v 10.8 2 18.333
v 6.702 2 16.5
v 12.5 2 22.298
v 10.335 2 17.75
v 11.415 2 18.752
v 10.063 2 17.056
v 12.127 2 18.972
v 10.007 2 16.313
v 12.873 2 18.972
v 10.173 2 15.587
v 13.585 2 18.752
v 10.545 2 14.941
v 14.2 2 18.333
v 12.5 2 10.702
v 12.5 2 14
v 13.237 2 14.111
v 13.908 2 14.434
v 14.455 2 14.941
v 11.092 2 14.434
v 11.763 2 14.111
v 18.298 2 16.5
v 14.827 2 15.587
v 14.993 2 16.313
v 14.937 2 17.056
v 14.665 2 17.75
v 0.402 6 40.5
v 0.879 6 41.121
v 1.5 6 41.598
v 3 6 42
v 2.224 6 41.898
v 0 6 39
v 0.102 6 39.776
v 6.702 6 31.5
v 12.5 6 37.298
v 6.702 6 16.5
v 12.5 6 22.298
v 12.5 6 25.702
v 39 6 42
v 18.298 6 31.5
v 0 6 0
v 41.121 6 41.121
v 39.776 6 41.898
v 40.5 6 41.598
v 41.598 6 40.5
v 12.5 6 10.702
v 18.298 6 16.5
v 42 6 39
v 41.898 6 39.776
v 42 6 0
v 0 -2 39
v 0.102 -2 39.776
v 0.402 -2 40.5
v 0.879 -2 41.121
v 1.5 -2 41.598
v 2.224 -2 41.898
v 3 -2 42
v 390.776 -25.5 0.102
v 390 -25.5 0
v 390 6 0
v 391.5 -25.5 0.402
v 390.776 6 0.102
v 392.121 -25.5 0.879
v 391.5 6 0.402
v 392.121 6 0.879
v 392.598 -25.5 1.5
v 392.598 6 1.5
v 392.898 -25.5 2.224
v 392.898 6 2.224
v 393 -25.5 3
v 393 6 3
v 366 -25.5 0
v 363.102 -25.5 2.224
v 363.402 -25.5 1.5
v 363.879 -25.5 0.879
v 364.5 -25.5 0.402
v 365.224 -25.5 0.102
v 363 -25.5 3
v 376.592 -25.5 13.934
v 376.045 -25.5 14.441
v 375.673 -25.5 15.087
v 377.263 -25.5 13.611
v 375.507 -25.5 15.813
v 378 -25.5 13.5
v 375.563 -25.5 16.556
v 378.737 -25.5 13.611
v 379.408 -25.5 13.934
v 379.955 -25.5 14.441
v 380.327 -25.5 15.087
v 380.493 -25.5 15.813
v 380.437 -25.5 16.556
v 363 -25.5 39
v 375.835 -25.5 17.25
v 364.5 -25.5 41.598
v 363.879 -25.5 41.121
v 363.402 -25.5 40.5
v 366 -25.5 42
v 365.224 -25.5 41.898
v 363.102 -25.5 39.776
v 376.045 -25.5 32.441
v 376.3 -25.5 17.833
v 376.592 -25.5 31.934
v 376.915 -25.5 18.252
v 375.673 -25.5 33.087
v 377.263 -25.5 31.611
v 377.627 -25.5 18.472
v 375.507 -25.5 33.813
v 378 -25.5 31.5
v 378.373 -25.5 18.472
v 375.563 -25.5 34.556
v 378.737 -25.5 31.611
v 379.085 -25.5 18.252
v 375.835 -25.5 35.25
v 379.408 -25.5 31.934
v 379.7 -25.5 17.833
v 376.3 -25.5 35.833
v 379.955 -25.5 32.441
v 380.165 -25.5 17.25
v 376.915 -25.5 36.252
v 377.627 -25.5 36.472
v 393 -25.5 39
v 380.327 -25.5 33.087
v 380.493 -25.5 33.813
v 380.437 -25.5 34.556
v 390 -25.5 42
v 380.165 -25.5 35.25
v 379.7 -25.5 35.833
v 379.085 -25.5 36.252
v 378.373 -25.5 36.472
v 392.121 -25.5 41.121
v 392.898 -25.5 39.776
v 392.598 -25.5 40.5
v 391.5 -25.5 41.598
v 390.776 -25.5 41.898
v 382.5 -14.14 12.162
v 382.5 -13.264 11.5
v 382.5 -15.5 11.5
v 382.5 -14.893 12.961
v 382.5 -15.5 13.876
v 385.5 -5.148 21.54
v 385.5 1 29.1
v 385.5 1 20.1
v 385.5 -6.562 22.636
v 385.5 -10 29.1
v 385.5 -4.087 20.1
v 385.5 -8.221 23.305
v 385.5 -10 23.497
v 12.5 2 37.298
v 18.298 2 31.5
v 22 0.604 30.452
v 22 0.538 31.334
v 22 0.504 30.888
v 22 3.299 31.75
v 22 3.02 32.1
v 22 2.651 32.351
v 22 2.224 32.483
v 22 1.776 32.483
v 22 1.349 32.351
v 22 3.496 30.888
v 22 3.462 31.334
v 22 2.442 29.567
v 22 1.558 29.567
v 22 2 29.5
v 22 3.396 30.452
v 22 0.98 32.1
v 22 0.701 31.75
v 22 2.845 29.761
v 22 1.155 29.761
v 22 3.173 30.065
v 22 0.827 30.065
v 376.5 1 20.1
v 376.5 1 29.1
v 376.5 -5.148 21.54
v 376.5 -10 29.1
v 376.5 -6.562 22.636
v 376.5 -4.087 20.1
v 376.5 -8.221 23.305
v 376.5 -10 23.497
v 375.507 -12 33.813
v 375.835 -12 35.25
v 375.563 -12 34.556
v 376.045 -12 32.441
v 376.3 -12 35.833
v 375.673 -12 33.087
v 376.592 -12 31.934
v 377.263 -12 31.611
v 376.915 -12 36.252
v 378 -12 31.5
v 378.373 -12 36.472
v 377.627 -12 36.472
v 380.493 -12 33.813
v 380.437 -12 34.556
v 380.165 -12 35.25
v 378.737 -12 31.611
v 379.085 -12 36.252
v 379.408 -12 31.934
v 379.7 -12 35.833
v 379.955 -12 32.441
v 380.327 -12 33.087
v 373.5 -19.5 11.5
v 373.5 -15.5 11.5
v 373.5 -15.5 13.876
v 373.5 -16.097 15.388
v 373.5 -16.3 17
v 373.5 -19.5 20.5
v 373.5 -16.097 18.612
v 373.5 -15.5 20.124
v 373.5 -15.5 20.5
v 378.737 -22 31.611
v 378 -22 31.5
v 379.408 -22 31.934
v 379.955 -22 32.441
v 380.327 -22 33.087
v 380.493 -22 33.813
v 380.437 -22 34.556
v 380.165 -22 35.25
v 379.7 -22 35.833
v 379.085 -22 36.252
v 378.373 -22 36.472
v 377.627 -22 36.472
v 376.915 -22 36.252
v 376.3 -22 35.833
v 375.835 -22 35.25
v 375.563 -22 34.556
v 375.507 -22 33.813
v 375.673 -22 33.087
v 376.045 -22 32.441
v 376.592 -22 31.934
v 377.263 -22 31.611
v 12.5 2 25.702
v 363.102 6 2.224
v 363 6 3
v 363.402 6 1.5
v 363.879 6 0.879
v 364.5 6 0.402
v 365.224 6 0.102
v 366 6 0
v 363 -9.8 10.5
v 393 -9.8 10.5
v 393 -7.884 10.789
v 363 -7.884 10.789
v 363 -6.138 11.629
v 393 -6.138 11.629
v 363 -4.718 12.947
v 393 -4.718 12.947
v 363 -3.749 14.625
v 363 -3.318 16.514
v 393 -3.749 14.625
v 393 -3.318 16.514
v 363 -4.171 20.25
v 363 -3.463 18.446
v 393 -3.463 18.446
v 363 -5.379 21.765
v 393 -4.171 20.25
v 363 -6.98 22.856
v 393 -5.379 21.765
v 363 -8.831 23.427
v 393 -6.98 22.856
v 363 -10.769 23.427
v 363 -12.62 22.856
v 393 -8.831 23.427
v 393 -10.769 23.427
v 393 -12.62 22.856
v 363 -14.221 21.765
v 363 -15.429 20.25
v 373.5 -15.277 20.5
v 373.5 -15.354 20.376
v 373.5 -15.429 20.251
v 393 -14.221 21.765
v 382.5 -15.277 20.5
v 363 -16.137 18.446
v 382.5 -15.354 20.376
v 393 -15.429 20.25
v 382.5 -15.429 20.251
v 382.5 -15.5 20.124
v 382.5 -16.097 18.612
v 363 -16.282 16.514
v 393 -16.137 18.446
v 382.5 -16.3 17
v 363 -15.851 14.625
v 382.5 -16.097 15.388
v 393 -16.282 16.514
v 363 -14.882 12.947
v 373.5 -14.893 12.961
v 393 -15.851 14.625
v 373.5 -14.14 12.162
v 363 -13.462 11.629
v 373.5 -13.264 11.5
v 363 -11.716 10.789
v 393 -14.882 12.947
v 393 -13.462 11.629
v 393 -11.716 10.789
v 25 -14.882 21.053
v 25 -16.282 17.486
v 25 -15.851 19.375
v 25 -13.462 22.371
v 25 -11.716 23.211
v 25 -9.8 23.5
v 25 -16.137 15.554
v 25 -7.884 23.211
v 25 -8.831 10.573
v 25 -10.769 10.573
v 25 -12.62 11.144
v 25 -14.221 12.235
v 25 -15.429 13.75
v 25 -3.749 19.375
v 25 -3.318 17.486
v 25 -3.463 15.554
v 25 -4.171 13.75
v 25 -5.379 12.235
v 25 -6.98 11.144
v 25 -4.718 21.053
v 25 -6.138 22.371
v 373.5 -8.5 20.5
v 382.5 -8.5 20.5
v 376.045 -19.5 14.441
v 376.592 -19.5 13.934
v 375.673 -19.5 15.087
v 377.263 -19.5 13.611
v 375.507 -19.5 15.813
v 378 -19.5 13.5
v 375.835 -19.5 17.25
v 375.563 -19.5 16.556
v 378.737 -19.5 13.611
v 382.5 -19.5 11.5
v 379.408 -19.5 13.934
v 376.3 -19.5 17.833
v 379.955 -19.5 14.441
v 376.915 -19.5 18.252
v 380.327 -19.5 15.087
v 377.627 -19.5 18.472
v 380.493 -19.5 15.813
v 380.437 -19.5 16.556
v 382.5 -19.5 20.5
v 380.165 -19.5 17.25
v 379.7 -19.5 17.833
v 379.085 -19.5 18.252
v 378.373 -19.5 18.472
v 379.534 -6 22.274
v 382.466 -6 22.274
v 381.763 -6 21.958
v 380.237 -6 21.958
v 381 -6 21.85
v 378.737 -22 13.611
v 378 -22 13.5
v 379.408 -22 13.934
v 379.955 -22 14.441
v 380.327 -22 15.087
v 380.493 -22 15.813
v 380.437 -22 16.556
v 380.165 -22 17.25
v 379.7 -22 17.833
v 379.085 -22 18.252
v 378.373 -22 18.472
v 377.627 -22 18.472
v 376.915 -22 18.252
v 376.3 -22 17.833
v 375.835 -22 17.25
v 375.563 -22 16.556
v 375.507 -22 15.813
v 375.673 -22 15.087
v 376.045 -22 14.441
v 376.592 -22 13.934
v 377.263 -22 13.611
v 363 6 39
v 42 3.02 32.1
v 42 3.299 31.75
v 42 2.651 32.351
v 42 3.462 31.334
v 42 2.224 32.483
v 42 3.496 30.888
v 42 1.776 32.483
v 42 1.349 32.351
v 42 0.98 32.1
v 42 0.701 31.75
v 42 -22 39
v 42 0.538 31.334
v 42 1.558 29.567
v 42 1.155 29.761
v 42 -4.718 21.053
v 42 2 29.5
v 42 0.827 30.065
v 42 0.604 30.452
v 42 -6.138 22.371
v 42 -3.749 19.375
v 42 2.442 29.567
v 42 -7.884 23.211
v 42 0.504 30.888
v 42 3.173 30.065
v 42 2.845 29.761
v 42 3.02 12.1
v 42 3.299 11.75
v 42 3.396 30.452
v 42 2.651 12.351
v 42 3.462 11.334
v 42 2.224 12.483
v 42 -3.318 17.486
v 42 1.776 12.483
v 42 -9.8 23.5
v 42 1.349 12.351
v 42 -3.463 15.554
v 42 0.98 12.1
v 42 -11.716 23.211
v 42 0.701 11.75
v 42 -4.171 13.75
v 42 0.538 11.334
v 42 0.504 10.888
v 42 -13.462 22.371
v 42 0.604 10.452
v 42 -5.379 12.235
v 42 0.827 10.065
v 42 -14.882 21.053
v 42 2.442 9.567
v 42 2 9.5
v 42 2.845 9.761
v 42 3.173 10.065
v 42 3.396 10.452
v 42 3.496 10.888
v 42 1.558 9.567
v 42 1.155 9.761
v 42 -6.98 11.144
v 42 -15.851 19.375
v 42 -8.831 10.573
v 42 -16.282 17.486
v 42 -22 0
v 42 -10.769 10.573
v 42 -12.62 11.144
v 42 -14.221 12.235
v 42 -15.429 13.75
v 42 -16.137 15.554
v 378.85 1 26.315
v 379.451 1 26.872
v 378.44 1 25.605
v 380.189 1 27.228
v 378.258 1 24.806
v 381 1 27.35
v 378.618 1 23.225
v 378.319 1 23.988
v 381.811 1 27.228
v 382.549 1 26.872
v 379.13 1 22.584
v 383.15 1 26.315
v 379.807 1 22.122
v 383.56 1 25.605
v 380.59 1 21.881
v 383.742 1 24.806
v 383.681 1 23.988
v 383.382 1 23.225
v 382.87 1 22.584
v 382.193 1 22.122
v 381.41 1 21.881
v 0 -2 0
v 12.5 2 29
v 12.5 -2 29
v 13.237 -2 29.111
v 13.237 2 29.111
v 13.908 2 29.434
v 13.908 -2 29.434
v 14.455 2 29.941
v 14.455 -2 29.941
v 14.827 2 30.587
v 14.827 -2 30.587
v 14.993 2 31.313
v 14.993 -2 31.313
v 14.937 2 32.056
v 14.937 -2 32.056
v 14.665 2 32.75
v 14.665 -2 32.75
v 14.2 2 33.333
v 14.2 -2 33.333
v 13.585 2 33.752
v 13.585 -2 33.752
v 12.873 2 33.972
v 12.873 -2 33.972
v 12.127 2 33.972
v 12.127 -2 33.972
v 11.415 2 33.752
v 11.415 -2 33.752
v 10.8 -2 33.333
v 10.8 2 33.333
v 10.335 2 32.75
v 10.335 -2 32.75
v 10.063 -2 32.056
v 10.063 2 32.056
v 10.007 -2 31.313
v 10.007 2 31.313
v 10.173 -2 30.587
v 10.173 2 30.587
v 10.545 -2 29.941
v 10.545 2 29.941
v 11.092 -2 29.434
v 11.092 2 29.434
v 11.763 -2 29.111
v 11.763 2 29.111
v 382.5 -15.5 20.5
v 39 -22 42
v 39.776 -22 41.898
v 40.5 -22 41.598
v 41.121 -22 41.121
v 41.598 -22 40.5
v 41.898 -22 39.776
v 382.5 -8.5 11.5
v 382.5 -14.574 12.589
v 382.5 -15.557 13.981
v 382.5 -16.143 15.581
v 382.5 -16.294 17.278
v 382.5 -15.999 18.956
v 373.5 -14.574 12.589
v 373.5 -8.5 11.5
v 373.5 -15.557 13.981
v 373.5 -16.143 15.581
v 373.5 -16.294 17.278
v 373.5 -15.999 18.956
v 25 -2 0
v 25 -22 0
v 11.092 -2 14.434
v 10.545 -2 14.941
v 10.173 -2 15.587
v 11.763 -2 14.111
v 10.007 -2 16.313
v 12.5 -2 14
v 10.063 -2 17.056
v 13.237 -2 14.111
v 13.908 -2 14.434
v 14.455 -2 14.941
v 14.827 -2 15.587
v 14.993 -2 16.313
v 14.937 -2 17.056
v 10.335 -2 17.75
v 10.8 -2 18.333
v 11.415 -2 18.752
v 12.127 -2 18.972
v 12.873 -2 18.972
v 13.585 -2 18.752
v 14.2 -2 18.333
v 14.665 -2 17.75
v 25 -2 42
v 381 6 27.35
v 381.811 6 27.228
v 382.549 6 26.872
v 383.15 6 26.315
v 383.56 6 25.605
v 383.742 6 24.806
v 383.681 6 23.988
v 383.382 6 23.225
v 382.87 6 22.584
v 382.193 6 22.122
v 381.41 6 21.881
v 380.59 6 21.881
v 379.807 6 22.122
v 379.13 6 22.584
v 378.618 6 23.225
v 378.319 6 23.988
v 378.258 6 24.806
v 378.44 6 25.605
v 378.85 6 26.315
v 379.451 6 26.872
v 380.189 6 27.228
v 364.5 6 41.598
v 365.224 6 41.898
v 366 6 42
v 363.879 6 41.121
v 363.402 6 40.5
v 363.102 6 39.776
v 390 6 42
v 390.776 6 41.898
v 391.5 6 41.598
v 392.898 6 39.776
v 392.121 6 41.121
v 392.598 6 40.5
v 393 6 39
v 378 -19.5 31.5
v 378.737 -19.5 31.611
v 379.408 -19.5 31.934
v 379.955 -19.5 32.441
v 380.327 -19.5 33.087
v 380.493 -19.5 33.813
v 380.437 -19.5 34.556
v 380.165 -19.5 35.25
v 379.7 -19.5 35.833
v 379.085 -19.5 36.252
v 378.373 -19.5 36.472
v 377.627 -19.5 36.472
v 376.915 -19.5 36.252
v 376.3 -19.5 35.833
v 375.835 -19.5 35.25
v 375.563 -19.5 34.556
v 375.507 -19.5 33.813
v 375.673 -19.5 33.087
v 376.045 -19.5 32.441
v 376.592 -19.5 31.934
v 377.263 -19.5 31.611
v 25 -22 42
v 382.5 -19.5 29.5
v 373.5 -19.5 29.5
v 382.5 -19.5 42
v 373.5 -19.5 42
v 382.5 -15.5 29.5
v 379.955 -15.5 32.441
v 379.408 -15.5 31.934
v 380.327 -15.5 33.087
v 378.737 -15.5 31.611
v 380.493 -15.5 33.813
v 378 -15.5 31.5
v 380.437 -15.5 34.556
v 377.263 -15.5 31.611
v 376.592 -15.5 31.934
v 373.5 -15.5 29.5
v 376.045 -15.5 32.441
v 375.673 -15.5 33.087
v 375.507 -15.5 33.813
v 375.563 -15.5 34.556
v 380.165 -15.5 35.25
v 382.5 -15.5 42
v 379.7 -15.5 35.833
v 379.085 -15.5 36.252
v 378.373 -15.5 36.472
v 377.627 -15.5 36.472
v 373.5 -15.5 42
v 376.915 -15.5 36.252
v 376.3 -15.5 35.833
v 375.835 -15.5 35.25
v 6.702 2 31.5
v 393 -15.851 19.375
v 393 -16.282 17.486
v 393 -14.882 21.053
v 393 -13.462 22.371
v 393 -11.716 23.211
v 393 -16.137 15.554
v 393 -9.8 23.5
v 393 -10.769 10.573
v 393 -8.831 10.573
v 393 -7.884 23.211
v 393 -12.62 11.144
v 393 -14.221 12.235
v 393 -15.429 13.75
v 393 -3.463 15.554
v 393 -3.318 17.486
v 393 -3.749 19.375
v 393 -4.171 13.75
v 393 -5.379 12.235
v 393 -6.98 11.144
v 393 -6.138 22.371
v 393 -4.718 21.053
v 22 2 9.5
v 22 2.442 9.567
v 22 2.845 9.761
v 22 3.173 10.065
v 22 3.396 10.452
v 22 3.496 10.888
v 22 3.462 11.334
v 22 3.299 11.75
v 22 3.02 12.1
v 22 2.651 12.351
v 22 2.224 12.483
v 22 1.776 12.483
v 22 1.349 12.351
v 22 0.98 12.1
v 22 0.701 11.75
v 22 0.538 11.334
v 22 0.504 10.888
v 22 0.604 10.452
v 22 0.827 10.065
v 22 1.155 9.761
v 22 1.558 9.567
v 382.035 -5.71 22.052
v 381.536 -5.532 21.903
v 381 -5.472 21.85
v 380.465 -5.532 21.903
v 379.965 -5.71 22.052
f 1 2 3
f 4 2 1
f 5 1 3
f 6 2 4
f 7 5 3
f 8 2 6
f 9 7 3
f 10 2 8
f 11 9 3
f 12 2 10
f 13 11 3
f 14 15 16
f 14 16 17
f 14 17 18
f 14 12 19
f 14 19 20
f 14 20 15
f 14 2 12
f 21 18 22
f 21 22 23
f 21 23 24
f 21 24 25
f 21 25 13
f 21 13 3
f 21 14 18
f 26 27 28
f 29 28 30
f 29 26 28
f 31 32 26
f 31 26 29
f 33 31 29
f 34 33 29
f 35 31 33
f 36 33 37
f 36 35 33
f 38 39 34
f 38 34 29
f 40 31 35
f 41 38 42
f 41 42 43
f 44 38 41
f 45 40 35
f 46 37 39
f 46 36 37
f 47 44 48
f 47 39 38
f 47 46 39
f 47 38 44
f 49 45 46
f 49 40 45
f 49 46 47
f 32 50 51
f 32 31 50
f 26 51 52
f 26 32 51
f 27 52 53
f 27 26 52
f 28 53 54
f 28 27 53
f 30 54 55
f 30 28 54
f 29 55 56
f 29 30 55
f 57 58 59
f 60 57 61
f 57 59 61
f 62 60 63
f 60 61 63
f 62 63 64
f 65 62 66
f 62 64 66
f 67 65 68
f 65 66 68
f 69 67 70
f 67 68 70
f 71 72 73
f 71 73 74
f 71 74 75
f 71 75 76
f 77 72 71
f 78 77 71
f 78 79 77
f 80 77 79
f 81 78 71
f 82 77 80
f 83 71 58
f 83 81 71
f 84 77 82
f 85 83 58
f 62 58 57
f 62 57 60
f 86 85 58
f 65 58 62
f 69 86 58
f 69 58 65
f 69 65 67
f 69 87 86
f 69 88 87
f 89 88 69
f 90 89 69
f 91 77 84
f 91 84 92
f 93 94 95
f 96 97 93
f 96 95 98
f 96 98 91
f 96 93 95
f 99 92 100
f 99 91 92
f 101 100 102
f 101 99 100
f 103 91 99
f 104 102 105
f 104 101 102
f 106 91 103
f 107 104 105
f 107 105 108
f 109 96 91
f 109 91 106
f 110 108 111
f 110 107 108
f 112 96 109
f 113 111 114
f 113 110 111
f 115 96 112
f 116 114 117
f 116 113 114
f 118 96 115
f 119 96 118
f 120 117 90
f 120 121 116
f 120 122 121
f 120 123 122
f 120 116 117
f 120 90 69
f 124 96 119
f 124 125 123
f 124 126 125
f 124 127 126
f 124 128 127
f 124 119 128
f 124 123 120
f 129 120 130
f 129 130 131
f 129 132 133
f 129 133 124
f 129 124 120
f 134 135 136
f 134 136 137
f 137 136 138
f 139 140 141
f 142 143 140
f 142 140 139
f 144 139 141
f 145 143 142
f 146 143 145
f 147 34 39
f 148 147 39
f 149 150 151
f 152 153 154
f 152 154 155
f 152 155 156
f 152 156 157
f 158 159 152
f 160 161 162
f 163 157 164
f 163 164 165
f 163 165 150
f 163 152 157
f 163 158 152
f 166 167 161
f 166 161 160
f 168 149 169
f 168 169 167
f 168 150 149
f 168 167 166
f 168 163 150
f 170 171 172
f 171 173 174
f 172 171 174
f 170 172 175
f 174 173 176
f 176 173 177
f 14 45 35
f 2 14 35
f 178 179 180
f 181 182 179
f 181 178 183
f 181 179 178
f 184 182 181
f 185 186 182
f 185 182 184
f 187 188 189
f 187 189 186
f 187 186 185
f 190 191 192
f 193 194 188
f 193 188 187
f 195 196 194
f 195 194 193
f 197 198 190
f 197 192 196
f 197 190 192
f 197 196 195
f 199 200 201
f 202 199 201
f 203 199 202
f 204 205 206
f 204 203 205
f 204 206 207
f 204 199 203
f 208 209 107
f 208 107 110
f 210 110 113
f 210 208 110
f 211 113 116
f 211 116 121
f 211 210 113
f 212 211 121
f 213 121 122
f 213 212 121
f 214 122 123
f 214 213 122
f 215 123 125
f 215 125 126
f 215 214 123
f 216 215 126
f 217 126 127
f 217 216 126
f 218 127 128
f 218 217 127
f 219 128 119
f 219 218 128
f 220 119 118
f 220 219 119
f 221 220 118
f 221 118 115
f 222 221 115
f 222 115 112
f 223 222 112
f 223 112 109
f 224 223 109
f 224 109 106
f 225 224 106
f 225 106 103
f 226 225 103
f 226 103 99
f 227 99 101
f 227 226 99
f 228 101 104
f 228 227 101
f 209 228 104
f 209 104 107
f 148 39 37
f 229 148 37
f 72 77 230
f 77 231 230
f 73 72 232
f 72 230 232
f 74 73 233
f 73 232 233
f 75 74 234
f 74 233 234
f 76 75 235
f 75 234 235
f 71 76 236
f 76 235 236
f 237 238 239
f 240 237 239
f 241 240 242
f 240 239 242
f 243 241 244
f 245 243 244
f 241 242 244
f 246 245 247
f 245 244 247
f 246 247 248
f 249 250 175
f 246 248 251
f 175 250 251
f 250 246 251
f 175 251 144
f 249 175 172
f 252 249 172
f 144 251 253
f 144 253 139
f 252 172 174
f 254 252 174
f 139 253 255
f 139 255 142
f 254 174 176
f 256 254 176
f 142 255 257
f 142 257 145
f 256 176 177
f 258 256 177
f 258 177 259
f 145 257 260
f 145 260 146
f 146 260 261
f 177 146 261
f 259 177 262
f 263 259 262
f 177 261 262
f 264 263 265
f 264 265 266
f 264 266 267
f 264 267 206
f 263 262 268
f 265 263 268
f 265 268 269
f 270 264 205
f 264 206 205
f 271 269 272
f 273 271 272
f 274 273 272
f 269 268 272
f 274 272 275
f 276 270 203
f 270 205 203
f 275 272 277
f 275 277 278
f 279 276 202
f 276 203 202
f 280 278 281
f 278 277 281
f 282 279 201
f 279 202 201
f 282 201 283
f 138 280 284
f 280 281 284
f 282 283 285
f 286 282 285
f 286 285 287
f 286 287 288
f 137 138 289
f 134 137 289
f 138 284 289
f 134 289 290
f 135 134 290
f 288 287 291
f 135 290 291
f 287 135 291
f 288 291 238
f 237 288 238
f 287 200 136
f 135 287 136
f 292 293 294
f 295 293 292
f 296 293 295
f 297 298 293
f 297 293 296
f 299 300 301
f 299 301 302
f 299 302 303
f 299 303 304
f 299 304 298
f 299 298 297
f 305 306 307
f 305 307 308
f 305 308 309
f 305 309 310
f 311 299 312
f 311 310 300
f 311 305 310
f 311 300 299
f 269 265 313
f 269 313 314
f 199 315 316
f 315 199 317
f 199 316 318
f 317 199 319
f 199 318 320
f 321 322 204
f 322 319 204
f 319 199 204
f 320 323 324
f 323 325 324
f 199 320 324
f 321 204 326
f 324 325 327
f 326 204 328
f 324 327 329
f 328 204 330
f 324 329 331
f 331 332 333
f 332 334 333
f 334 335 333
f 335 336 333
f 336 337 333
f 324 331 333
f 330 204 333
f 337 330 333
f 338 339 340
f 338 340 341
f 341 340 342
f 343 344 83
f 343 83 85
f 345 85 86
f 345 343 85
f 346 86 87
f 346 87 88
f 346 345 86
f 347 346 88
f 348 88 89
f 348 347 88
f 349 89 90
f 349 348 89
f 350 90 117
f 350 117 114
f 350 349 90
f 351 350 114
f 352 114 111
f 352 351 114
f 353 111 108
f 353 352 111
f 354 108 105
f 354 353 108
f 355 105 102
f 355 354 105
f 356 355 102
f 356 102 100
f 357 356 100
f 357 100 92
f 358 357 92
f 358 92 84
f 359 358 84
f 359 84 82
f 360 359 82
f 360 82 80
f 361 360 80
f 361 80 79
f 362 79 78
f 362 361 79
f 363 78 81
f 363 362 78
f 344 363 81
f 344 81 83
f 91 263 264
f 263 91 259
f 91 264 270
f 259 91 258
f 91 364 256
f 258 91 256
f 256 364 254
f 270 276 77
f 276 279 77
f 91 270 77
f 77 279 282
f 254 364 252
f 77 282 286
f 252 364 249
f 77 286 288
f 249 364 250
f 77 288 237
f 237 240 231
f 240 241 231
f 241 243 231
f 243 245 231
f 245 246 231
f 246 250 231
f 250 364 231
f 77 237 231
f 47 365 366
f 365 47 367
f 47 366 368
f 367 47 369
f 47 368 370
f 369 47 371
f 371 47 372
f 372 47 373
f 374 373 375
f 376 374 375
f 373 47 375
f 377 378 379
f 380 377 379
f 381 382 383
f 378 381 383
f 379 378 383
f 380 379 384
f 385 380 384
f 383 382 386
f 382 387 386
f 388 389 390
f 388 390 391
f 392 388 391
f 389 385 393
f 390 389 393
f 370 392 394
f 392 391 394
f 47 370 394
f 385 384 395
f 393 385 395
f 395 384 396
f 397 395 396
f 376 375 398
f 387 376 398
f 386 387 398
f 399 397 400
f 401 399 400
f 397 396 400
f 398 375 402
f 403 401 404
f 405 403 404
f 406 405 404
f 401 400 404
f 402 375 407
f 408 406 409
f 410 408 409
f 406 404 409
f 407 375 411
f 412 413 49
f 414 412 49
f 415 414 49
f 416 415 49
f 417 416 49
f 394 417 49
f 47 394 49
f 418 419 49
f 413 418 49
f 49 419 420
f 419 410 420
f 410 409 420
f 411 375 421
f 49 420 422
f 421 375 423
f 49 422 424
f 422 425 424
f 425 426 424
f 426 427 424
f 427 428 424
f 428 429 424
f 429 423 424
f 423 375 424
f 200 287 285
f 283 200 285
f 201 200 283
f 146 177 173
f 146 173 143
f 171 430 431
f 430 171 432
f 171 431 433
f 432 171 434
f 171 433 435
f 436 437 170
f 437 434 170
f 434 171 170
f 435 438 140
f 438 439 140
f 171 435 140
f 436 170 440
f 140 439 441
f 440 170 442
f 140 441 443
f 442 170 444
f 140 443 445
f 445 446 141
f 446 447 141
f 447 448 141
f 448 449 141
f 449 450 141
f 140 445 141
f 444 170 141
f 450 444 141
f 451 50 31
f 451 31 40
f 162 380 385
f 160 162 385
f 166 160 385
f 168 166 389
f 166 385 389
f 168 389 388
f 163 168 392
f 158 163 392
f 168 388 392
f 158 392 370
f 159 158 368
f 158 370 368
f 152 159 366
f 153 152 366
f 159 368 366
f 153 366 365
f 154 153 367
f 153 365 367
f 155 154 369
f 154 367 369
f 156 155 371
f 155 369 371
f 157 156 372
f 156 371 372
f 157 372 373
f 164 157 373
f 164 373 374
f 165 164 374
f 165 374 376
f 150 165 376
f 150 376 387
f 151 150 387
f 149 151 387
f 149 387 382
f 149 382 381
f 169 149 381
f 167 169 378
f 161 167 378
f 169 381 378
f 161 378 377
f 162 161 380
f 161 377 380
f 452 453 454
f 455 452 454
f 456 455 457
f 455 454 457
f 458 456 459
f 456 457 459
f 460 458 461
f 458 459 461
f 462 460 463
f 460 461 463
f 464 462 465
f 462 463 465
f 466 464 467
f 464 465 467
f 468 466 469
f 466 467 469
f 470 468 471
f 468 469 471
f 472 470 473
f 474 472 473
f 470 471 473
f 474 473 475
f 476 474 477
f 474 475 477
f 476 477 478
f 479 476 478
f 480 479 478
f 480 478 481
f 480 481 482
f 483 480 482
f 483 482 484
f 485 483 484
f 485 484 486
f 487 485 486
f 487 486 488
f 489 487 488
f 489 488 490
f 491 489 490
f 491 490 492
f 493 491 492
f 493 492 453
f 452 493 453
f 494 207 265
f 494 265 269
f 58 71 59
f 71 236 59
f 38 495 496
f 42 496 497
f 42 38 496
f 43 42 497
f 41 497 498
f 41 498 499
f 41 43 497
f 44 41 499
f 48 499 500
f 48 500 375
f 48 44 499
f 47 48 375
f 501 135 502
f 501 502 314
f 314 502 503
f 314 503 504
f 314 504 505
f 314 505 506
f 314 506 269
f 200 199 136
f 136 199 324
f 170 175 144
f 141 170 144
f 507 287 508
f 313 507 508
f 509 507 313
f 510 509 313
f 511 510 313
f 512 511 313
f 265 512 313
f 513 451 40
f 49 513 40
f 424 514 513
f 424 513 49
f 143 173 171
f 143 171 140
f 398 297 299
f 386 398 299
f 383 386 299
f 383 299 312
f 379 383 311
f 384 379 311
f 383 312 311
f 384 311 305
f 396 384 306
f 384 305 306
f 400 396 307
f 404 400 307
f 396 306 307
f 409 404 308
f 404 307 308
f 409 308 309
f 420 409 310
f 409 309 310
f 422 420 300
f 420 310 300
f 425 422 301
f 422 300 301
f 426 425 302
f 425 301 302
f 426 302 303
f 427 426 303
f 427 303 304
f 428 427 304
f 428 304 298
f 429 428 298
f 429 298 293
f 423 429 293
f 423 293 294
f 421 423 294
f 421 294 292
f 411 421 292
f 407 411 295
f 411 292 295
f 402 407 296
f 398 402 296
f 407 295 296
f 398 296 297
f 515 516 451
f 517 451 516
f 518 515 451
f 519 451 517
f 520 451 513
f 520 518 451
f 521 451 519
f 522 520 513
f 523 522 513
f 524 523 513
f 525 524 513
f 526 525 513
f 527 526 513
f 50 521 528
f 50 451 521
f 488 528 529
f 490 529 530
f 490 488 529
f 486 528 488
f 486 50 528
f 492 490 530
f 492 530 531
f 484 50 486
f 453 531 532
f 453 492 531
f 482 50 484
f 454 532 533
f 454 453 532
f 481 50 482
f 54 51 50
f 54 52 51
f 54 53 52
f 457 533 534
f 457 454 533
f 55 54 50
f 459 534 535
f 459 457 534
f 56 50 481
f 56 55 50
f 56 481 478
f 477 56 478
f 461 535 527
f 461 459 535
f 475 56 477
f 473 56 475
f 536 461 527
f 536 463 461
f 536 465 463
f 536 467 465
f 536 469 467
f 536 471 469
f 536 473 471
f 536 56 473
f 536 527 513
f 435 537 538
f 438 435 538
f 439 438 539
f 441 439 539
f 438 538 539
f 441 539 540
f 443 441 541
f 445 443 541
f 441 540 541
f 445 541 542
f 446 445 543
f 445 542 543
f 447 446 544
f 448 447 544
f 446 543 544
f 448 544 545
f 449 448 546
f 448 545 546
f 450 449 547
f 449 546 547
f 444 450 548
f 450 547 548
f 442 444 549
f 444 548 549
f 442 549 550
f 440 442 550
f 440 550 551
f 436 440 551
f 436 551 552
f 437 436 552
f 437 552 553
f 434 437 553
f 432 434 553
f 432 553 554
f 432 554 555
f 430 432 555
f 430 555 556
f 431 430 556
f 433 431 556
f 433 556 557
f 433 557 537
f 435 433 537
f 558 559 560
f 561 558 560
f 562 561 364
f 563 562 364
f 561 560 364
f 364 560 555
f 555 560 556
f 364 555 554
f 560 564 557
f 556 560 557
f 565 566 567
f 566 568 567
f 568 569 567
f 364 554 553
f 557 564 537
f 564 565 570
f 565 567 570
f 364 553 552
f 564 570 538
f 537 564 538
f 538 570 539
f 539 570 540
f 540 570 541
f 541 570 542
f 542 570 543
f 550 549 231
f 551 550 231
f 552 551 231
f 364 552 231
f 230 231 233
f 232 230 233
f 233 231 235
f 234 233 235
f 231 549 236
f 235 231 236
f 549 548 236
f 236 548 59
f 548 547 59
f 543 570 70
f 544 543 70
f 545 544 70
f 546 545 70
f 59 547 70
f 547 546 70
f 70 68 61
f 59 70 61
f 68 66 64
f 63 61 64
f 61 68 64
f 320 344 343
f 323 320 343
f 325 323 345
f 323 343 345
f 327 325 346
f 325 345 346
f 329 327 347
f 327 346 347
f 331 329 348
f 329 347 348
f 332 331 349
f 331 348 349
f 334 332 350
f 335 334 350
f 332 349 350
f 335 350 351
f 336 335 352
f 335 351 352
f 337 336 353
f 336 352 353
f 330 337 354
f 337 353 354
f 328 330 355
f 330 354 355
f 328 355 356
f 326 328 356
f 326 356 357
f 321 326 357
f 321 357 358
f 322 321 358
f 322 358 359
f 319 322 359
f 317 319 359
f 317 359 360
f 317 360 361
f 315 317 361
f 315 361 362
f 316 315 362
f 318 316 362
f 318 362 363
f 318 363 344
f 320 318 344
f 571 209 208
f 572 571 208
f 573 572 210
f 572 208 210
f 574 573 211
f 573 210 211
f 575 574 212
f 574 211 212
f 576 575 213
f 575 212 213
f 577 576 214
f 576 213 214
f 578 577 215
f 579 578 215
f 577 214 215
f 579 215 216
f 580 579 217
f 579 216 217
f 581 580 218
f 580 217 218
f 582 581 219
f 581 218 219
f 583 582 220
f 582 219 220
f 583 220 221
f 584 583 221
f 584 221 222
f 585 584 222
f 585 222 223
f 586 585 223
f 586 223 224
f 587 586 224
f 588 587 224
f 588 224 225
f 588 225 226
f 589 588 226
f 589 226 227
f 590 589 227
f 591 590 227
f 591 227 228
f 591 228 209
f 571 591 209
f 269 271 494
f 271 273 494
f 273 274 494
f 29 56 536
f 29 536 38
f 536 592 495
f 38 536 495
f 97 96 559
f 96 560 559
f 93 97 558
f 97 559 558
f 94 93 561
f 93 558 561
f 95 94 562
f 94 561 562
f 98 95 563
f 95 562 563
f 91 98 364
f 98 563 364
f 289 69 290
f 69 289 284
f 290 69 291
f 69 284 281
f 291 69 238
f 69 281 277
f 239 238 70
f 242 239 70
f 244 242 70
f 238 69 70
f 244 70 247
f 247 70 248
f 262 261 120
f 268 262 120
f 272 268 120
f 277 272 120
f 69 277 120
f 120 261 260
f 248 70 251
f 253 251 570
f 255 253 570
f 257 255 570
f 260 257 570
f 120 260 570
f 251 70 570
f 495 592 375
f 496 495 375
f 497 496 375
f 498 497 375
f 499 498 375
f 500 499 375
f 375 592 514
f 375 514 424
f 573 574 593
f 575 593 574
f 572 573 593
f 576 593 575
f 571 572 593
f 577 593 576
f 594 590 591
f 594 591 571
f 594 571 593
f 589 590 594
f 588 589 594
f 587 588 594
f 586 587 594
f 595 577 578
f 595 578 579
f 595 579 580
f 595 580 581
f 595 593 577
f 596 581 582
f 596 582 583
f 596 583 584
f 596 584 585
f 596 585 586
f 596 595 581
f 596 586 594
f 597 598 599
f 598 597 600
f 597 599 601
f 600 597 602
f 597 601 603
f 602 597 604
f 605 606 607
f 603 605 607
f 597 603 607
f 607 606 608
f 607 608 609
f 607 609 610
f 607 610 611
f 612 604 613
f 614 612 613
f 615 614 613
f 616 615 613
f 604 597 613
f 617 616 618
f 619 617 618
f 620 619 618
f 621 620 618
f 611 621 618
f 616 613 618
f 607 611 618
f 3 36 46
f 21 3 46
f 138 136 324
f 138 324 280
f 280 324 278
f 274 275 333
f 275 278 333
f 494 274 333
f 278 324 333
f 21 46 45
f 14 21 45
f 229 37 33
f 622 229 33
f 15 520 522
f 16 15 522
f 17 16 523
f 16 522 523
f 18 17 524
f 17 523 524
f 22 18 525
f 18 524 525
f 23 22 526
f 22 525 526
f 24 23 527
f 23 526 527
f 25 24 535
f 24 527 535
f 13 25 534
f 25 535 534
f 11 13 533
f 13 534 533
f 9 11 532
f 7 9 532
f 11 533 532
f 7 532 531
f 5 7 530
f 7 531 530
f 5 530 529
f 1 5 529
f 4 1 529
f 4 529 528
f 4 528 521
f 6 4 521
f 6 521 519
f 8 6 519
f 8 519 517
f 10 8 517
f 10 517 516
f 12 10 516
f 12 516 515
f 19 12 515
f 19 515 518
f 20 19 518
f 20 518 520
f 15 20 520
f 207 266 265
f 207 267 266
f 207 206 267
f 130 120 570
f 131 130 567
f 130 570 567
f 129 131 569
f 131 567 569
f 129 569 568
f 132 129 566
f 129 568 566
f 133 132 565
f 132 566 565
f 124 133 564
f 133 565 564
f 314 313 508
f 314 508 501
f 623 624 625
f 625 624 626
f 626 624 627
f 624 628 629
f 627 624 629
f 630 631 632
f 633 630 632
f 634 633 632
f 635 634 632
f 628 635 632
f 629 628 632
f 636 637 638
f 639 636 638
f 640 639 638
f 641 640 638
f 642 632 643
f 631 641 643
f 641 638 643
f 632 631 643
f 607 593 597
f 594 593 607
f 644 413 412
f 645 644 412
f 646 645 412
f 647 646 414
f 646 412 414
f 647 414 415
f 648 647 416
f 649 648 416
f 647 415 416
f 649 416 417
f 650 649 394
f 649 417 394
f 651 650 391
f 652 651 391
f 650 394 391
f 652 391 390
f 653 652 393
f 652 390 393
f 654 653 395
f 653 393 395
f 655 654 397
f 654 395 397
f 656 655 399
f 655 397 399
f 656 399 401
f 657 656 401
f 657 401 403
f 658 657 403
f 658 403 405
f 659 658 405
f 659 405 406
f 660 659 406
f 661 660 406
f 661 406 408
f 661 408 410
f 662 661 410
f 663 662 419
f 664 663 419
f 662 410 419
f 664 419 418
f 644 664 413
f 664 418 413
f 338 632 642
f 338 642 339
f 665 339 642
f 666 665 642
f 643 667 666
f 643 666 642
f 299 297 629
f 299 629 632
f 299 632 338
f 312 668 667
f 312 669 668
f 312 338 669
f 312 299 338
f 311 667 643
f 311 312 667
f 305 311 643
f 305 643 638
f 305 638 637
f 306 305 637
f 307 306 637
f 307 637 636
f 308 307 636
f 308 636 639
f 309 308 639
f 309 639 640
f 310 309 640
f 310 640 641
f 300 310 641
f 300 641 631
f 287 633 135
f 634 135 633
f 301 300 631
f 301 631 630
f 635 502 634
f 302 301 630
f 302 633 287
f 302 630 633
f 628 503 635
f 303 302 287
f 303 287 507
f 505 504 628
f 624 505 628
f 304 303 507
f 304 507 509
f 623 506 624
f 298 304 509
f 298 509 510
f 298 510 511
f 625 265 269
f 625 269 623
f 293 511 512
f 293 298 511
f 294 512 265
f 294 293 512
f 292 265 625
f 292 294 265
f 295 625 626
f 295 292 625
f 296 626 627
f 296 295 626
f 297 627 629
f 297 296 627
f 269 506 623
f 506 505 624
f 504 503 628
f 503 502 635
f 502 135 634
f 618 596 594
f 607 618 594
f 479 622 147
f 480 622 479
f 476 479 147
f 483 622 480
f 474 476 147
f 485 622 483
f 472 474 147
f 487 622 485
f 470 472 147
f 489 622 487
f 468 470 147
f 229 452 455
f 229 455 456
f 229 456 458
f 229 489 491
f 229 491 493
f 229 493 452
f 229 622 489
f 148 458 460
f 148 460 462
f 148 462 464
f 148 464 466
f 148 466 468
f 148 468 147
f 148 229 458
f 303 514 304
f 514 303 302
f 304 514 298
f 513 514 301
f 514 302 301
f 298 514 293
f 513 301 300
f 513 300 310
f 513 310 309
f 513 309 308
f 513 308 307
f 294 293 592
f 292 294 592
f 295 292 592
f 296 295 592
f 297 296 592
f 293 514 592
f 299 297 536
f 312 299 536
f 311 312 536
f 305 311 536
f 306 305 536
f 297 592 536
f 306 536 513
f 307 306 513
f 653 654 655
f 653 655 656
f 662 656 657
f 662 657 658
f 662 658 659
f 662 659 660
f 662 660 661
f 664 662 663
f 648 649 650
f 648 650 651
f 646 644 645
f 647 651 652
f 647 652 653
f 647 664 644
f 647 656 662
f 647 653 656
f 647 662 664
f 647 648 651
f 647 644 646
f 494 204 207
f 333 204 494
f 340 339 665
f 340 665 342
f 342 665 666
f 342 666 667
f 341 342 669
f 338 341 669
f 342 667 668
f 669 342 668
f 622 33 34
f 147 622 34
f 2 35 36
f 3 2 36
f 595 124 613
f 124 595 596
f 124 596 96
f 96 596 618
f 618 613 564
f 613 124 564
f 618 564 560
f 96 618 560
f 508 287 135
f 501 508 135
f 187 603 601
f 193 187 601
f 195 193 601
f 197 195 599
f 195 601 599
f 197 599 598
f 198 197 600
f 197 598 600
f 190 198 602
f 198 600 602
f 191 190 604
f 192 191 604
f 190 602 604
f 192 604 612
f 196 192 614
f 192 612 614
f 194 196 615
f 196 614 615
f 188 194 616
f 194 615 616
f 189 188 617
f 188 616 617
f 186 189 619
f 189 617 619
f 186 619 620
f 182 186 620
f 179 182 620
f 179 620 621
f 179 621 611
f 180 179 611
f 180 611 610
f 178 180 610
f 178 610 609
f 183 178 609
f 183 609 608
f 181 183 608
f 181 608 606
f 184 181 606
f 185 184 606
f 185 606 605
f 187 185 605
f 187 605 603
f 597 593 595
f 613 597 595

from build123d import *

# Parameters (mm, degrees)
SKETCH2_W                = 42
SKETCH2_H                = 42
BOSS_EXTRUDE1_DEPTH      = 22
SKETCH3_W                = 42
SKETCH3_H                = 42
BOSS_EXTRUDE2_DEPTH      = 6
BOSS_EXTRUDE3_START      = -25
SKETCH4_R                = 6.5
BOSS_EXTRUDE3_DEPTH      = 368
CUT_EXTRUDE6_START       = -25
SKETCH4_3_R              = 6.5
CUT_EXTRUDE6_DEPTH       = 17
SKETCH8_W                = 42
SKETCH8_H                = 28
SKETCH8_R                = 6.5
BOSS_EXTRUDE5_DEPTH      = 30
SKETCH11_W               = 25
SKETCH11_H               = 20
CUT_EXTRUDE9_DEPTH       = 50
SKETCH10_R               = 2.75
CUT_EXTRUDE8_DEPTH       = 12
FILLET2_R                = 3
FILLET1_R                = 3
SKETCH12_R               = 2.5
CUT_EXTRUDE10_DEPTH      = 20
CUT_EXTRUDE11_DEPTH      = 4
SKETCH14_R               = 2.5
CUT_EXTRUDE12_DEPTH      = 10
SKETCH15_R               = 1.5
CUT_EXTRUDE13_DEPTH      = 20
SKETCH16_R               = 2.5
BOSS_EXTRUDE6_DEPTH      = 3.5
CUT_EXTRUDE14_START      = -6
SKETCH18_W               = 9
SKETCH18_H               = 9
CUT_EXTRUDE14_DEPTH      = 4
SKETCH19_W               = 9
SKETCH19_H               = 9
CUT_EXTRUDE15_DEPTH      = 7
CUT_EXTRUDE16_DEPTH      = 7
CUT_EXTRUDE16_DEPTH_BACK = 4
SKETCH20_W               = 9
SKETCH20_H               = 9


with BuildPart() as part:
    # Sketch2 → Boss-Extrude1 (new body)
    with BuildSketch(Plane(origin=(0, 0, 0), x_dir=(1, 0, 0), z_dir=(0, 1, 0))):
        with Locations((21, -21)):
            Rectangle(SKETCH2_W, SKETCH2_H)
    extrude(amount=-BOSS_EXTRUDE1_DEPTH)

    # Sketch3 → Boss-Extrude2 (add)
    with BuildSketch(Plane(origin=(0, 0, 0), x_dir=(1, 0, 0), z_dir=(0, 1, 0))):
        with Locations((21, -21)):
            Rectangle(SKETCH3_W, SKETCH3_H)
    extrude(amount=BOSS_EXTRUDE2_DEPTH)

    # Sketch4<3> → Cut-Extrude6 (cut)
    with BuildSketch(Plane.ZY.offset(CUT_EXTRUDE6_START)):
        with Locations((17, -9.8)):
            Circle(SKETCH4_3_R)
    extrude(amount=-CUT_EXTRUDE6_DEPTH, mode=Mode.SUBTRACT)

    # Sketch11 → Cut-Extrude9 (cut)
    with BuildSketch(Plane.XY.offset(42)):
        with Locations((12.5, -12)):
            Rectangle(SKETCH11_W, SKETCH11_H)
    extrude(amount=-CUT_EXTRUDE9_DEPTH, mode=Mode.SUBTRACT)

    # Fillet1
    fillet1_edges = [part.edges().sort_by_distance(p)[0] for p in [
        (0, 2, 42),
        (42, -8, 42),
    ]]
    fillet(fillet1_edges, radius=FILLET1_R)

    # Sketch12 → Cut-Extrude10 (cut)
    with BuildSketch(Plane.XZ.offset(2)):
        with Locations(Location((12.5, 31.5, 0), (0, 0, 270))):
            Circle(SKETCH12_R)
        with Locations(Location((12.5, 16.5, 0), (0, 0, 270))):
            Circle(SKETCH12_R)
    extrude(amount=-CUT_EXTRUDE10_DEPTH, mode=Mode.SUBTRACT)

    # Sketch13 → Cut-Extrude11 (cut)
    with BuildSketch(Plane(origin=(0, 6, 0), x_dir=(1, 0, 0), z_dir=(0, 1, 0))):
        Polygon((6.701724394, -31.5), (12.5, -37.298275606), (18.298275606, -31.5), (12.5, -25.701724394), align=None)
        Polygon((6.701724394, -16.5), (12.5, -22.298275606), (18.298275606, -16.5), (12.5, -10.701724394), align=None)
    extrude(amount=-CUT_EXTRUDE11_DEPTH, mode=Mode.SUBTRACT)

    # Sketch15 → Cut-Extrude13 (cut)
    with BuildSketch(Plane(origin=(42, 0, 0), x_dir=(0, 0, -1), z_dir=(1, 0, 0))):
        with Locations((-31, 2)):
            Circle(SKETCH15_R)
        with Locations((-11, 2)):
            Circle(SKETCH15_R)
    extrude(amount=-CUT_EXTRUDE13_DEPTH, mode=Mode.SUBTRACT)


with BuildPart() as body_2:
    # Sketch4 → Boss-Extrude3 (new body)
    with BuildSketch(Plane.ZY.offset(BOSS_EXTRUDE3_START)):
        with Locations((17, -9.8)):
            Circle(SKETCH4_R)
    extrude(amount=-BOSS_EXTRUDE3_DEPTH)


with BuildPart() as body_3:
    # Sketch8 → Boss-Extrude5 (new body)
    with BuildSketch(Plane(origin=(393, 0, 0), x_dir=(0, 0, -1), z_dir=(1, 0, 0))):
        with Locations((-21, -8)):
            Rectangle(SKETCH8_W, SKETCH8_H)
        with Locations((-17, -9.8)):
            Circle(SKETCH8_R, mode=Mode.SUBTRACT)
    extrude(amount=-BOSS_EXTRUDE5_DEPTH)


with BuildPart() as cut_extrude8_tool:
    # Sketch10 → Cut-Extrude8 (new body)
    with BuildSketch(Plane(origin=(0, 6, 0), x_dir=(1, 0, 0), z_dir=(0, 1, 0))):
        with Locations(Location((381, -24.6, 0), (0, 0, 270))):
            Circle(SKETCH10_R)
    extrude(amount=-CUT_EXTRUDE8_DEPTH)


with BuildPart() as body_2_1:
    add(body_2.part)

    # Cut-Extrude8: cut by cut_extrude8_tool
    add(cut_extrude8_tool.part, mode=Mode.SUBTRACT)


with BuildPart() as body_3_1:
    add(body_3.part)

    # Cut-Extrude8: cut by cut_extrude8_tool
    add(cut_extrude8_tool.part, mode=Mode.SUBTRACT)

    # Fillet2
    fillet2_edges = [body_3_1.edges().sort_by_distance(p)[0] for p in [
        (363, -8, 42),
        (393, -8, 42),
        (393, -8, 0),
        (363, -8, 0),
    ]]
    fillet(fillet2_edges, radius=FILLET2_R)


with BuildPart() as cut_extrude12_tool:
    # Sketch14 → Cut-Extrude12 (new body)
    with BuildSketch(Plane.XZ.offset(22)):
        with Locations(Location((378, 34, 0), (0, 0, 270))):
            Circle(SKETCH14_R)
        with Locations(Location((378, 16, 0), (0, 0, 270))):
            Circle(SKETCH14_R)
    extrude(amount=-CUT_EXTRUDE12_DEPTH)


with BuildPart() as body_2_2:
    add(body_2_1.part)

    # Cut-Extrude12: cut by cut_extrude12_tool
    add(cut_extrude12_tool.part, mode=Mode.SUBTRACT)


with BuildPart() as body_3_2:
    add(body_3_1.part)

    # Cut-Extrude12: cut by cut_extrude12_tool
    add(cut_extrude12_tool.part, mode=Mode.SUBTRACT)

    # Sketch16 → Boss-Extrude6 (add)
    with BuildSketch(Plane.XZ.offset(22)):
        with BuildLine():
            Line((390, 42), (366, 42))
            ThreePointArc((366, 42), (363.878679656, 41.121320344), (363, 39))
            Line((363, 39), (363, 3))
            ThreePointArc((363, 3), (363.878679656, 0.878679656), (366, 0))
            Line((366, 0), (390, 0))
            ThreePointArc((390, 0), (392.121320344, 0.878679656), (393, 3))
            Line((393, 3), (393, 39))
            ThreePointArc((393, 39), (392.121320344, 41.121320344), (390, 42))
        make_face()
        with Locations(Location((378, 16, 0), (0, 0, 270))):
            Circle(SKETCH16_R, mode=Mode.SUBTRACT)
        with Locations(Location((378, 34, 0), (0, 0, 270))):
            Circle(SKETCH16_R, mode=Mode.SUBTRACT)
    extrude(amount=BOSS_EXTRUDE6_DEPTH)


with BuildPart() as cut_extrude14_tool:
    # Sketch18 → Cut-Extrude14 (new body)
    with BuildSketch(Plane.XZ.offset(25.5).offset(CUT_EXTRUDE14_START)):
        Polygon((373.5, 38.5), (373.5, 42), (382.5, 42), (382.5, 38.5), (382.5, 29.5), (373.5, 29.5), align=None)
        with Locations((378, 16)):
            Rectangle(SKETCH18_W, SKETCH18_H)
    extrude(amount=-CUT_EXTRUDE14_DEPTH)


with BuildPart() as body_2_3:
    add(body_2_2.part)

    # Cut-Extrude14: cut by cut_extrude14_tool
    add(cut_extrude14_tool.part, mode=Mode.SUBTRACT)


with BuildPart() as body_3_3:
    add(body_3_2.part)

    # Cut-Extrude14: cut by cut_extrude14_tool
    add(cut_extrude14_tool.part, mode=Mode.SUBTRACT)


with BuildPart() as cut_extrude15_tool:
    # Sketch19 → Cut-Extrude15 (new body)
    with BuildSketch(Plane.XZ.offset(15.5)):
        with Locations((378, 16)):
            Rectangle(SKETCH19_W, SKETCH19_H)
    extrude(amount=-CUT_EXTRUDE15_DEPTH)


with BuildPart() as body_2_4:
    add(body_2_3.part)

    # Cut-Extrude15: cut by cut_extrude15_tool
    add(cut_extrude15_tool.part, mode=Mode.SUBTRACT)


with BuildPart() as body_3_4:
    add(body_3_3.part)

    # Cut-Extrude15: cut by cut_extrude15_tool
    add(cut_extrude15_tool.part, mode=Mode.SUBTRACT)

    # Sketch20 → Cut-Extrude16 (cut, two sides: drawn at the far end of the back side and taken through both)
    with BuildSketch(Plane(origin=(0, -6, 0), x_dir=(1, 0, 0), z_dir=(0, 1, 0)).offset(-CUT_EXTRUDE16_DEPTH_BACK)):
        with Locations((381, -24.6)):
            Rectangle(SKETCH20_W, SKETCH20_H)
    extrude(amount=CUT_EXTRUDE16_DEPTH + CUT_EXTRUDE16_DEPTH_BACK, mode=Mode.SUBTRACT)


solid = Compound([part.part, body_2_4.part, body_3_4.part])
